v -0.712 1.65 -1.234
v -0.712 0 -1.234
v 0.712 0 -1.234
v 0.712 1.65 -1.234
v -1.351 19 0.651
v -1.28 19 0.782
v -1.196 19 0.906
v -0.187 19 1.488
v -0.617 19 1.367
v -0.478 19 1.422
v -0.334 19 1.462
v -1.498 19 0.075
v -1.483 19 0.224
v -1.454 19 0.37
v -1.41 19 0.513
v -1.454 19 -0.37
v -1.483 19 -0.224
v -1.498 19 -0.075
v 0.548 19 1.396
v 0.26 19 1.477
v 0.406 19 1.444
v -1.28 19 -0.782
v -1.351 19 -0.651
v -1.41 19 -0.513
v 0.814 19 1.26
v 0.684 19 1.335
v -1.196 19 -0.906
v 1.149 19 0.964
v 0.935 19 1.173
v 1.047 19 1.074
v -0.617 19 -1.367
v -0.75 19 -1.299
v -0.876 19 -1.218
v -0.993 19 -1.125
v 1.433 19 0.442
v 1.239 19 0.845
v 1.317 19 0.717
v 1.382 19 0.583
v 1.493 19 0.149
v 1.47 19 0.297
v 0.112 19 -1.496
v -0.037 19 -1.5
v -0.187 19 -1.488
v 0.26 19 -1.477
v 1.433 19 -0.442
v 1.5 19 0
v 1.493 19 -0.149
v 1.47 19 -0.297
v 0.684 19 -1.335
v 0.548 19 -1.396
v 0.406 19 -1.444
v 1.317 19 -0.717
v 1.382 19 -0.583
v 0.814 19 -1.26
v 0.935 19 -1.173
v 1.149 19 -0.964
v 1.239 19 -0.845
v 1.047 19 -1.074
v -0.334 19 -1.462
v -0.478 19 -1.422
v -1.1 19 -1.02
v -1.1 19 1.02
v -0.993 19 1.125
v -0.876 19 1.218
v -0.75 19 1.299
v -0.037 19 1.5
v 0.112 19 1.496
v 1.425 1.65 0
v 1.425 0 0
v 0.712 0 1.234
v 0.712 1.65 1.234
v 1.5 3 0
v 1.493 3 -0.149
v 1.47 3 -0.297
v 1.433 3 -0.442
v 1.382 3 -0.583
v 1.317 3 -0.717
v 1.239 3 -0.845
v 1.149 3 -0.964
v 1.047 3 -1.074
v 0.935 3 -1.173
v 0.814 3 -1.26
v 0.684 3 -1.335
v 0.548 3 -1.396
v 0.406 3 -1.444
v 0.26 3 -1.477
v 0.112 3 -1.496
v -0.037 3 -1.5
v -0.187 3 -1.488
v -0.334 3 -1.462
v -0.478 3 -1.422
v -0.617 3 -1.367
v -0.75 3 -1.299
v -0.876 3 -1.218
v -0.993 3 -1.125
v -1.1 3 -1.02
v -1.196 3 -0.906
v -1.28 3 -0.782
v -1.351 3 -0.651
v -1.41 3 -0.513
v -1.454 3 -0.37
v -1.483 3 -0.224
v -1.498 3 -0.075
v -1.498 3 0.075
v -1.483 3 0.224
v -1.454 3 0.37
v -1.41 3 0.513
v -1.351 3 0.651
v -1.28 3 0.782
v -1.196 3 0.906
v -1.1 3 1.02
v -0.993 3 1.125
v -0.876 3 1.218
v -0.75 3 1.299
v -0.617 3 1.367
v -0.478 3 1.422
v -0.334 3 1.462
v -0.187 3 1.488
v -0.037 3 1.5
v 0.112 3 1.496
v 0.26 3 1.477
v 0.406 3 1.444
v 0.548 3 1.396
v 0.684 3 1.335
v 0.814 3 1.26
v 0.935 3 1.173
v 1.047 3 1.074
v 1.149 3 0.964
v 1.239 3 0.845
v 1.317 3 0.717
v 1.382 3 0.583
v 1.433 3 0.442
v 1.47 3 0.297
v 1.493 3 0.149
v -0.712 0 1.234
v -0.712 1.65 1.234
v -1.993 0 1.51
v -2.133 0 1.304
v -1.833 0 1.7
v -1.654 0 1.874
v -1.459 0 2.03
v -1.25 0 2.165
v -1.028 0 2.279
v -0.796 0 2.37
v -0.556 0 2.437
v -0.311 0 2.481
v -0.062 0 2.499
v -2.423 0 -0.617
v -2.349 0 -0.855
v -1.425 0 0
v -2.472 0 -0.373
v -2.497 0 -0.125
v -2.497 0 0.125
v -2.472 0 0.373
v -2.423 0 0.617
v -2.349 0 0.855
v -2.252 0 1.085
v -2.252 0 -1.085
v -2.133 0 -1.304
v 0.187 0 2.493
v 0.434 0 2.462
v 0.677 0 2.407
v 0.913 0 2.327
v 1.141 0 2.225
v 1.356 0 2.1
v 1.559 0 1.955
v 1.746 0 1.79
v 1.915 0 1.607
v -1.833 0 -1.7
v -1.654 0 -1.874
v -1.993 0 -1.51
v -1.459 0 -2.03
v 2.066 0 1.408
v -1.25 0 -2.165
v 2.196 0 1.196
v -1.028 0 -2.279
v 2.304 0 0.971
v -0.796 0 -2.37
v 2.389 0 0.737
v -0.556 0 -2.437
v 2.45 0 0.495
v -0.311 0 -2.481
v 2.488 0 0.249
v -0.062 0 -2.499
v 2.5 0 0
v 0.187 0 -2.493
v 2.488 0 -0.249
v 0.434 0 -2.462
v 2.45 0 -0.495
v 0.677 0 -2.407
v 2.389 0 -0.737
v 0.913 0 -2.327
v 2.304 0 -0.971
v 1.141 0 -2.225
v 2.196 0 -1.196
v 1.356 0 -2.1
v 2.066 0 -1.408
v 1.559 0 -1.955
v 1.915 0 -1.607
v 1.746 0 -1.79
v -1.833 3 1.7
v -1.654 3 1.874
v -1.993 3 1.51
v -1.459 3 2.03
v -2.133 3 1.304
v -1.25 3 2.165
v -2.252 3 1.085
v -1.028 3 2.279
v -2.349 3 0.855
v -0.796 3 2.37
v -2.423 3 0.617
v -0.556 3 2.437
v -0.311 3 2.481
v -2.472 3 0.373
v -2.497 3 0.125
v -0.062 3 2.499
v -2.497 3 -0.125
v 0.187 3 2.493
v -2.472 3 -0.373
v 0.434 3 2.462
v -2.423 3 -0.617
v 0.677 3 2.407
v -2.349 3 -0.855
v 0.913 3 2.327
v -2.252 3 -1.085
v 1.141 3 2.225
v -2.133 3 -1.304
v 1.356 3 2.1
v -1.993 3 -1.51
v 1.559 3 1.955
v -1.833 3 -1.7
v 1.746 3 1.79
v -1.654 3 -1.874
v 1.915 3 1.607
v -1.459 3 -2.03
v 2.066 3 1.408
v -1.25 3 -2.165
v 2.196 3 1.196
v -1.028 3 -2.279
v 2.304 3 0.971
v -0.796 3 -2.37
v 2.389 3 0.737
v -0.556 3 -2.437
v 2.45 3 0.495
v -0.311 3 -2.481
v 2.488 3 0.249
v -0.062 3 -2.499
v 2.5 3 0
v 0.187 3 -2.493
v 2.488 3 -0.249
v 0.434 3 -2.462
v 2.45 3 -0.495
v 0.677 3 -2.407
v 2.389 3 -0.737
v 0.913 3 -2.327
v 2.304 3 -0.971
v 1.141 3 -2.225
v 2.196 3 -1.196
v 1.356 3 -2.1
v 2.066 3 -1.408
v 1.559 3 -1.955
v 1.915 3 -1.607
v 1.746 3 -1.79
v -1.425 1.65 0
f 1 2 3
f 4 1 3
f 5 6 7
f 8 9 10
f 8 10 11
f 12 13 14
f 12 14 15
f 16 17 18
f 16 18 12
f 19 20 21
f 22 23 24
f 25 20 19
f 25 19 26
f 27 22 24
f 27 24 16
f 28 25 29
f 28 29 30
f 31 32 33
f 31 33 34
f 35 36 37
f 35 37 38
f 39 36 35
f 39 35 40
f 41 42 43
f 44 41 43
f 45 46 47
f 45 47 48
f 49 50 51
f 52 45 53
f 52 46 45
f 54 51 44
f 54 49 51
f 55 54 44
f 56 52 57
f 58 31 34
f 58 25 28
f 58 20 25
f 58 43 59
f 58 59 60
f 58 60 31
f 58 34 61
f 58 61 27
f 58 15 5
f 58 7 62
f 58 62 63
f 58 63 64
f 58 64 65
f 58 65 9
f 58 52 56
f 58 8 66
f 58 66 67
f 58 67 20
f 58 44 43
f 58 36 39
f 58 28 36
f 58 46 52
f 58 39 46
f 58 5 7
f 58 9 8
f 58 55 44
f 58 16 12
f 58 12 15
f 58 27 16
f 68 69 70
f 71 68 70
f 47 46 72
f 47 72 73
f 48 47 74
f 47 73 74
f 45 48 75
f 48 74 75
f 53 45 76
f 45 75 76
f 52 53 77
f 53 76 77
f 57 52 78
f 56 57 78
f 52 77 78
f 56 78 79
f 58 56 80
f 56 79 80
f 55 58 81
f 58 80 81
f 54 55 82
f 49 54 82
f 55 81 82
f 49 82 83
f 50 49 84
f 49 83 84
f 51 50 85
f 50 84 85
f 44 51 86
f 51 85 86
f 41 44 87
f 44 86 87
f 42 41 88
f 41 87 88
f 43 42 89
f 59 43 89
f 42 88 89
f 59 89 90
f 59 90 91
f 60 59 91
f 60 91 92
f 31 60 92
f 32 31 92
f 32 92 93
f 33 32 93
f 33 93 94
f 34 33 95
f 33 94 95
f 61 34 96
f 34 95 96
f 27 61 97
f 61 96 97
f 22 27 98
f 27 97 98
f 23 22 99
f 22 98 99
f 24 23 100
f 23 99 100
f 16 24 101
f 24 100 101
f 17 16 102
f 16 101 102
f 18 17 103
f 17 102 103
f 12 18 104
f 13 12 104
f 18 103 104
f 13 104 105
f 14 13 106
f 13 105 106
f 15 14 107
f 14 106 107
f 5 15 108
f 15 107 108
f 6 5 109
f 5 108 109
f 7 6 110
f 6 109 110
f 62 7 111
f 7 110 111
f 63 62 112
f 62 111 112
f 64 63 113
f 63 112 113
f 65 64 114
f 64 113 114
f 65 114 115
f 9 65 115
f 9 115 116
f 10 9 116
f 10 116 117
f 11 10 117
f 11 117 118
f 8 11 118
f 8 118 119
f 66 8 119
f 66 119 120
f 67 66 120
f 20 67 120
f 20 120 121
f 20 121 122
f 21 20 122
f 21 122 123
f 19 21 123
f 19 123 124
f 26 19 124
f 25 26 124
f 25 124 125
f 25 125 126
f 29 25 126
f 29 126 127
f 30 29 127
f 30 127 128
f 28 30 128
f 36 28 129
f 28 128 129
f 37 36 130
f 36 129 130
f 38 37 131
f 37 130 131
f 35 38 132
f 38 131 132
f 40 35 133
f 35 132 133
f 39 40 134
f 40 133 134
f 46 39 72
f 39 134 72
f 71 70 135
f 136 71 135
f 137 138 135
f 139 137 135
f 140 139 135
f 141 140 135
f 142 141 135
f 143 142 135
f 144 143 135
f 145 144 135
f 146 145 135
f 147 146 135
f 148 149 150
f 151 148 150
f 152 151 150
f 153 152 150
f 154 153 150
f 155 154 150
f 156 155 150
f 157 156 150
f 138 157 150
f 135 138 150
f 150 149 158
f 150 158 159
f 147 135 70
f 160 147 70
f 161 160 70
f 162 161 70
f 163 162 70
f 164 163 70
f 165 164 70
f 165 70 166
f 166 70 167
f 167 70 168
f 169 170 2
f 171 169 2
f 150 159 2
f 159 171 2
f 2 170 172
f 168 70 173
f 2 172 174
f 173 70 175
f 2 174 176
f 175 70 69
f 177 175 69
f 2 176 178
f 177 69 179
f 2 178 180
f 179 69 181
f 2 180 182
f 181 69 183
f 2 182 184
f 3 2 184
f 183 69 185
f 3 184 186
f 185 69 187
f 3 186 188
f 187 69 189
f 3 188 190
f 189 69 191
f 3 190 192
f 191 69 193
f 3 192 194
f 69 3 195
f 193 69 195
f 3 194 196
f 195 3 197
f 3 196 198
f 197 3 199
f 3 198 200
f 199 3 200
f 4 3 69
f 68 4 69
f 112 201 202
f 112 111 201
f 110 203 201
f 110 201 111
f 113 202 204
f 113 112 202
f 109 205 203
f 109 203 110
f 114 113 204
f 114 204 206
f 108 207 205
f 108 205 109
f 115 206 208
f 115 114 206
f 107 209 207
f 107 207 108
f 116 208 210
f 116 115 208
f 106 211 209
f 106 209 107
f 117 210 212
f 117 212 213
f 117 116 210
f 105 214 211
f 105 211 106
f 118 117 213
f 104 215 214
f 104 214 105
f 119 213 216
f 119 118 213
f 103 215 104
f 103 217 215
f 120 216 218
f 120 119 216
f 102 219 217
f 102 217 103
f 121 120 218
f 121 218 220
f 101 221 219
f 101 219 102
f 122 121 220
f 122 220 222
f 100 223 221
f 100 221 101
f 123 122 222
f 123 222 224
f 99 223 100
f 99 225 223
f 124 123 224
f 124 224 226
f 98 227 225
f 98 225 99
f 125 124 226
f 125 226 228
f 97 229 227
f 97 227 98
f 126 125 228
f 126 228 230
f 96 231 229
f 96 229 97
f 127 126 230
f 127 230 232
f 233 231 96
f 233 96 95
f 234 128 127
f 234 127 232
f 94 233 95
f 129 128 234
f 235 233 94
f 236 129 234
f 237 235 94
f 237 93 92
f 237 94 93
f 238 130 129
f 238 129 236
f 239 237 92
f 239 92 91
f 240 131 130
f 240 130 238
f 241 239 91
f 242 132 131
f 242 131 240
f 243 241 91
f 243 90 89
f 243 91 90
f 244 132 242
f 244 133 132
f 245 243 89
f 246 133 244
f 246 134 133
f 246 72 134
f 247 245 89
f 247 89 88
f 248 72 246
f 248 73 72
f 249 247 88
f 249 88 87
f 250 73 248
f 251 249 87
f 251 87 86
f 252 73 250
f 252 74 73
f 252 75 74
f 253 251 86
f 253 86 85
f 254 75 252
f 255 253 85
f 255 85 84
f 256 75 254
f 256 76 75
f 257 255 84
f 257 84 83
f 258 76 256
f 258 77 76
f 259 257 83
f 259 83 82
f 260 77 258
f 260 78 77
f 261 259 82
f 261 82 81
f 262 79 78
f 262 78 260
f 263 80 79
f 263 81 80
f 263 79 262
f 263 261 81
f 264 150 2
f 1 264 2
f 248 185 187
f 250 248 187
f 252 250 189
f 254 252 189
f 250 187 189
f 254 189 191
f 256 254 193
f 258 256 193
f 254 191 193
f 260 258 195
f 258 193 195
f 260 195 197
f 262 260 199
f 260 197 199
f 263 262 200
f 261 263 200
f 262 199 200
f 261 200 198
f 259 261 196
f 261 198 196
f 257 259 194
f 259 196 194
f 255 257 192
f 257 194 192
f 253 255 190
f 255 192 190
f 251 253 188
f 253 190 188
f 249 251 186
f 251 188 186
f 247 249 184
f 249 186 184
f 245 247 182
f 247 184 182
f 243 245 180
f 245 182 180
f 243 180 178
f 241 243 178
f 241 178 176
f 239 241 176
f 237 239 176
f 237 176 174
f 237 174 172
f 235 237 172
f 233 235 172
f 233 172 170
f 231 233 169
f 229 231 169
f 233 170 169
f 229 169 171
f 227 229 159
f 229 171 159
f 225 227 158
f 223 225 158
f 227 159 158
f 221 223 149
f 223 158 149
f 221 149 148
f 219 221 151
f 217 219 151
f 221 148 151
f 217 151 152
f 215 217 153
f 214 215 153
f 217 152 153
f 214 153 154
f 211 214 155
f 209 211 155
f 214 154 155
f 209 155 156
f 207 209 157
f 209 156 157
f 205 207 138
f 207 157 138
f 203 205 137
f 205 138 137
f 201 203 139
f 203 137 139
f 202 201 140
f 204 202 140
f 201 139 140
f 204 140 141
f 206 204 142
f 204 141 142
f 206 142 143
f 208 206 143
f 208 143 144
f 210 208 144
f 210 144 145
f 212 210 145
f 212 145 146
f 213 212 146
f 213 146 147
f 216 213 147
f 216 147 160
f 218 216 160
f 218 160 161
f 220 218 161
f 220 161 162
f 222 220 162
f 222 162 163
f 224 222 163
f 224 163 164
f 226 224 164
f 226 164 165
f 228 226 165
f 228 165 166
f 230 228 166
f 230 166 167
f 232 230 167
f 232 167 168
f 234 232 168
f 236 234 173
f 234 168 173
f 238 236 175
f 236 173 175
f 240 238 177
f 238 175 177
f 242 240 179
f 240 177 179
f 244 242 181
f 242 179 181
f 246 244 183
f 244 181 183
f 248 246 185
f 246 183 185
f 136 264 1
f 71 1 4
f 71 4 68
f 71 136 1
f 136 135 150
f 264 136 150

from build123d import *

# Parameters (mm, degrees)
SKETCH_1_R          = 2.5
EXTRUDE_1_DEPTH     = 3
SKETCH_2_R          = 1.5
EXTRUDE_2_DEPTH     = 16
CUT_EXTRUDE_1_DEPTH = 1.65


with BuildPart() as part:
    # 草图1 → 凸台-拉伸1 (new body)
    with BuildSketch(Plane(origin=(0, 0, 0), x_dir=(1, 0, 0), z_dir=(0, 1, 0))):
        Circle(SKETCH_1_R)
    extrude(amount=EXTRUDE_1_DEPTH)

    # 草图2 → 凸台-拉伸2 (add)
    with BuildSketch(Plane(origin=(0, 3, 0), x_dir=(1, 0, 0), z_dir=(0, 1, 0))):
        Circle(SKETCH_2_R)
    extrude(amount=EXTRUDE_2_DEPTH)

    # 草图3 → 切除-拉伸1 (cut)
    with BuildSketch(Plane.XZ):
        Polygon((1.425, 0), (0.7125, 1.2340862), (-0.7125, 1.2340862), (-1.425, 0), (-0.7125, -1.2340862), (0.7125, -1.2340862), align=None)
    extrude(amount=-CUT_EXTRUDE_1_DEPTH, mode=Mode.SUBTRACT)


solid = part.part
